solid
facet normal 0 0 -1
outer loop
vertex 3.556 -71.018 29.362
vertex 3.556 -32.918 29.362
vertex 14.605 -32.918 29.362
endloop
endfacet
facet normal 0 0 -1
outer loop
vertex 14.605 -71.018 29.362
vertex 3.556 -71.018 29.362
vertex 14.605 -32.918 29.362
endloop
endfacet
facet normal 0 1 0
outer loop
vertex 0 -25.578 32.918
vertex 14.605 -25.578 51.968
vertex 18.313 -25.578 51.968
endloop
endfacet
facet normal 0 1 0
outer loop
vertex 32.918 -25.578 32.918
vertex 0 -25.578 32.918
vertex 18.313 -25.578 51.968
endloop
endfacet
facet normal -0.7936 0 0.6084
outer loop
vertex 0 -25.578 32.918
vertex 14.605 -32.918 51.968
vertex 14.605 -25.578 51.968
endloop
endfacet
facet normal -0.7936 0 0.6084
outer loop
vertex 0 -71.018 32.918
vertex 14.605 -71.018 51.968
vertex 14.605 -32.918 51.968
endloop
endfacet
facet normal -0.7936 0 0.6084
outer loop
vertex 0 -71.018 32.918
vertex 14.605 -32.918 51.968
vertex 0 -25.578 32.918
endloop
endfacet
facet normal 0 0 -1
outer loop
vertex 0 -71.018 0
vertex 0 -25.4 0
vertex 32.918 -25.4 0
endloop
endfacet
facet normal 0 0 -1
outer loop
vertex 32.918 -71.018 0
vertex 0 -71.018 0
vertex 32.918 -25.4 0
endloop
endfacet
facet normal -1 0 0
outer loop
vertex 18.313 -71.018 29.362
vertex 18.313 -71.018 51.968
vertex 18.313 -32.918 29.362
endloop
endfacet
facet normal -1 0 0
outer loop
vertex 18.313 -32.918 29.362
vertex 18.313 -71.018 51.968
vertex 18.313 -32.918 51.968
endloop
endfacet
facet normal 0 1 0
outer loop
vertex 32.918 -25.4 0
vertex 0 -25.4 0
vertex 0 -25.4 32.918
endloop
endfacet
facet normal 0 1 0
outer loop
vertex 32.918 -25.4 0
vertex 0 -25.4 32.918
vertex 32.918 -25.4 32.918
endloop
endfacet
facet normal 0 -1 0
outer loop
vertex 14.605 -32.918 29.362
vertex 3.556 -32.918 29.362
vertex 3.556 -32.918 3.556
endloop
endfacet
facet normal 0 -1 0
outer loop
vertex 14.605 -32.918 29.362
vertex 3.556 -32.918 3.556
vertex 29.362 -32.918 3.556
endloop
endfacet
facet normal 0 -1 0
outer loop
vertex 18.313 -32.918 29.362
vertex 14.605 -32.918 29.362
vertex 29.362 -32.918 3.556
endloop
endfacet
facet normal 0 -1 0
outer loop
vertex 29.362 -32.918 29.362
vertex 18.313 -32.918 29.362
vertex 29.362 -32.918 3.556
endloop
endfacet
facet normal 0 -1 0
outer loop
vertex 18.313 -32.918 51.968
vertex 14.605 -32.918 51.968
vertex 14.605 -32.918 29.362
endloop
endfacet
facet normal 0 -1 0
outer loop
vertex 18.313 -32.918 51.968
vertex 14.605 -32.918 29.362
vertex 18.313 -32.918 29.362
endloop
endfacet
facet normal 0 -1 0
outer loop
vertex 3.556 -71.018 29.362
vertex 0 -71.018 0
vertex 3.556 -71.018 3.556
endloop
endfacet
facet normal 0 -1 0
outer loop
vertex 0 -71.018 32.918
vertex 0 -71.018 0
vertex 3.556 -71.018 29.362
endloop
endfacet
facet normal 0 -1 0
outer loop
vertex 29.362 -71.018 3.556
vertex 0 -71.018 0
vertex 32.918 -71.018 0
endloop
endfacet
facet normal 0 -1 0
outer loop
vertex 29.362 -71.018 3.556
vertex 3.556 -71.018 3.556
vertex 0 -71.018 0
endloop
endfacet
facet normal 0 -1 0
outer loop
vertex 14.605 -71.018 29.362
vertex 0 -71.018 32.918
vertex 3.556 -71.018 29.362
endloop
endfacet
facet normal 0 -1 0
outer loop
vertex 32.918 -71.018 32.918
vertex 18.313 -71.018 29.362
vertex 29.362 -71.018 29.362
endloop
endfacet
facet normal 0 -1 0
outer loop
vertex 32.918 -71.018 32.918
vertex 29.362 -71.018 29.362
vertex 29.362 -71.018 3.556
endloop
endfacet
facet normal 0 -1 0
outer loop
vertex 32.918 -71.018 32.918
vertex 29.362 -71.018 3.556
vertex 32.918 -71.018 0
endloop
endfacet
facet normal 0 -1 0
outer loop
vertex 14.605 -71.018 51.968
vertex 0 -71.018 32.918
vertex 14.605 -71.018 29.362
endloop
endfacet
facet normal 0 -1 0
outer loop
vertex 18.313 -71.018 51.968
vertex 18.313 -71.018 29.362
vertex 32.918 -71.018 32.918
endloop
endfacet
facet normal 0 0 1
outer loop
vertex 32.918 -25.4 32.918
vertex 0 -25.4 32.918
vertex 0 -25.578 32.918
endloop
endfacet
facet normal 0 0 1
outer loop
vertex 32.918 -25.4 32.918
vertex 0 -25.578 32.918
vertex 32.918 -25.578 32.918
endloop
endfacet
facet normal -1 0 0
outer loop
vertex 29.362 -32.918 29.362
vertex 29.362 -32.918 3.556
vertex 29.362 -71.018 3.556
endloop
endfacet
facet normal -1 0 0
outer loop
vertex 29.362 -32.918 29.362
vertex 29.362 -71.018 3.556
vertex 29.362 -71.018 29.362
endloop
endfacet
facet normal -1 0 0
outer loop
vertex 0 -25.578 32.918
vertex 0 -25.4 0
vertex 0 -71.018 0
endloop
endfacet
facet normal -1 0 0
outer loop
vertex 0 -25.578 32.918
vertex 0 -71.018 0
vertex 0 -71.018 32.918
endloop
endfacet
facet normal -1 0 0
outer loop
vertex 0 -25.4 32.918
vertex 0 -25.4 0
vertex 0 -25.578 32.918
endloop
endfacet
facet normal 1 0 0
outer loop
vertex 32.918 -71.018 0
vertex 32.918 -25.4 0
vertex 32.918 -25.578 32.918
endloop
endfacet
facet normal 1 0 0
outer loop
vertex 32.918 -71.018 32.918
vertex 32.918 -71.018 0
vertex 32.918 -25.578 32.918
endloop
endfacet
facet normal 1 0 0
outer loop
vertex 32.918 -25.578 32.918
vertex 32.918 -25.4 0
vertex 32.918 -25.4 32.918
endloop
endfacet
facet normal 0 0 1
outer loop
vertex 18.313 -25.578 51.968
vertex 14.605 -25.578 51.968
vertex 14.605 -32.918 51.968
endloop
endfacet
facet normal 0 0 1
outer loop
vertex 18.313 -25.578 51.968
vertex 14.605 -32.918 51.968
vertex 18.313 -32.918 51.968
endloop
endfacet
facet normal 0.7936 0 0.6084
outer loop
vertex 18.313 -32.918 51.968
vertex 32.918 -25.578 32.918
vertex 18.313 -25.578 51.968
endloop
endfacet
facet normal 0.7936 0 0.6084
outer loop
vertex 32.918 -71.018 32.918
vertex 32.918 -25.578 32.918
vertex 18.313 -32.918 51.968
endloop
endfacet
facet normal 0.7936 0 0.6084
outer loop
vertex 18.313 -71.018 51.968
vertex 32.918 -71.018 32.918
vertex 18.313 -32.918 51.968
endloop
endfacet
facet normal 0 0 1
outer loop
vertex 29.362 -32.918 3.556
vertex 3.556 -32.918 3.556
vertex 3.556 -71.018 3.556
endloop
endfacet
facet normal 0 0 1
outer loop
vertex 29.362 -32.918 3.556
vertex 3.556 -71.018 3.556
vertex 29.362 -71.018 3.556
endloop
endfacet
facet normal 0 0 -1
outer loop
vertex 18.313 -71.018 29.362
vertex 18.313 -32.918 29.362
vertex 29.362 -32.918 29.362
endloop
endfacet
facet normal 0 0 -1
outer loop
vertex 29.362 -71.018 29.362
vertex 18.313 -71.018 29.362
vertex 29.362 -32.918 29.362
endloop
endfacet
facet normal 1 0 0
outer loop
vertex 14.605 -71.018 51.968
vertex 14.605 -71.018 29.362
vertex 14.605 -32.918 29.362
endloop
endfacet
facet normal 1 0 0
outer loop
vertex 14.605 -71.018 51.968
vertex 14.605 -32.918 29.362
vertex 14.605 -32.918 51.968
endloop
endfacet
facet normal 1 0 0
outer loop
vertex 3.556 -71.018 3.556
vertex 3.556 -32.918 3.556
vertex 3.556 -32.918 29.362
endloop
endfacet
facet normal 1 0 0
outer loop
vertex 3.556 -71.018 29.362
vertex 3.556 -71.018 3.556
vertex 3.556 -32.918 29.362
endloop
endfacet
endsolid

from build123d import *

# Parameters (mm, degrees)
F0_W      = 32.9184
F0_H      = 32.9184
F1_DEPTH  = 32.9184
F2_W      = 32.9184
F2_H      = 32.9184
F2_W_2    = 25.8064
F2_H_2    = 25.8064
F3_DEPTH  = 76.2
F4_W      = 3.7084
F4_H      = 76.2
F5_DEPTH  = 5.08
F7_DEPTH  = 76.2
F8_W      = 3.7084
F8_H      = 19.05
F9_DEPTH  = 7.3406
F10_DEPTH = 25.4
F11_DEPTH = 38.1


with BuildPart() as f1:
    # F0 (on Top) → F1 (new body)
    with BuildSketch(Plane.XY):
        with Locations((16.4592, -16.4592)):
            Rectangle(F0_W, F0_H)
    extrude(amount=F1_DEPTH)

    # F2 (on face) → F3 (join)
    with BuildSketch(Plane.XZ.offset(32.9184)):
        with Locations((16.4592, 16.4592)):
            Rectangle(F2_W, F2_H)
        with Locations((16.4592, 16.4592)):
            Rectangle(F2_W_2, F2_H_2, mode=Mode.SUBTRACT)
    extrude(amount=F3_DEPTH)

    # F4 (on face) → F5 (cut)
    with BuildSketch(Plane.XY.offset(32.9184)):
        with Locations((16.4592, -71.0184)):
            Rectangle(F4_W, F4_H)
    extrude(amount=-F5_DEPTH, mode=Mode.SUBTRACT)

    # F6 (on face) → F7 (join)
    with BuildSketch(Plane.XZ.offset(109.1184)):
        Polygon((0, 32.9184), (14.605, 32.9184), (14.605, 51.9684), align=None)
        Polygon((18.3134, 32.9184), (32.9184, 32.9184), (18.3134, 51.9684), align=None)
    extrude(amount=-F7_DEPTH)

    # F8 (on face) → F9 (join)
    with BuildSketch(Plane.XZ.offset(32.9184)):
        Polygon((18.3134, 51.9684), (18.3134, 32.9184), (32.9184, 32.9184), align=None)
        with Locations((16.4592, 42.4434)):
            Rectangle(F8_W, F8_H)
        Polygon((0, 32.9184), (14.605, 32.9184), (14.605, 51.9684), align=None)
    extrude(amount=-F9_DEPTH)

    # F10 (cut): a face of the model
    f10_faces = [f1.faces().sort_by_distance(p)[0] for p in [
        (16.4592, 0, 16.4592),
    ]]
    extrude(f10_faces, amount=-F10_DEPTH, mode=Mode.SUBTRACT)

    # F11 (cut): a face of the model
    f11_faces = [f1.faces().sort_by_distance(p)[0] for p in [
        (32.3032304578, -109.1184, 16.4592),
    ]]
    extrude(f11_faces, amount=-F11_DEPTH, mode=Mode.SUBTRACT)


solid = f1.part
